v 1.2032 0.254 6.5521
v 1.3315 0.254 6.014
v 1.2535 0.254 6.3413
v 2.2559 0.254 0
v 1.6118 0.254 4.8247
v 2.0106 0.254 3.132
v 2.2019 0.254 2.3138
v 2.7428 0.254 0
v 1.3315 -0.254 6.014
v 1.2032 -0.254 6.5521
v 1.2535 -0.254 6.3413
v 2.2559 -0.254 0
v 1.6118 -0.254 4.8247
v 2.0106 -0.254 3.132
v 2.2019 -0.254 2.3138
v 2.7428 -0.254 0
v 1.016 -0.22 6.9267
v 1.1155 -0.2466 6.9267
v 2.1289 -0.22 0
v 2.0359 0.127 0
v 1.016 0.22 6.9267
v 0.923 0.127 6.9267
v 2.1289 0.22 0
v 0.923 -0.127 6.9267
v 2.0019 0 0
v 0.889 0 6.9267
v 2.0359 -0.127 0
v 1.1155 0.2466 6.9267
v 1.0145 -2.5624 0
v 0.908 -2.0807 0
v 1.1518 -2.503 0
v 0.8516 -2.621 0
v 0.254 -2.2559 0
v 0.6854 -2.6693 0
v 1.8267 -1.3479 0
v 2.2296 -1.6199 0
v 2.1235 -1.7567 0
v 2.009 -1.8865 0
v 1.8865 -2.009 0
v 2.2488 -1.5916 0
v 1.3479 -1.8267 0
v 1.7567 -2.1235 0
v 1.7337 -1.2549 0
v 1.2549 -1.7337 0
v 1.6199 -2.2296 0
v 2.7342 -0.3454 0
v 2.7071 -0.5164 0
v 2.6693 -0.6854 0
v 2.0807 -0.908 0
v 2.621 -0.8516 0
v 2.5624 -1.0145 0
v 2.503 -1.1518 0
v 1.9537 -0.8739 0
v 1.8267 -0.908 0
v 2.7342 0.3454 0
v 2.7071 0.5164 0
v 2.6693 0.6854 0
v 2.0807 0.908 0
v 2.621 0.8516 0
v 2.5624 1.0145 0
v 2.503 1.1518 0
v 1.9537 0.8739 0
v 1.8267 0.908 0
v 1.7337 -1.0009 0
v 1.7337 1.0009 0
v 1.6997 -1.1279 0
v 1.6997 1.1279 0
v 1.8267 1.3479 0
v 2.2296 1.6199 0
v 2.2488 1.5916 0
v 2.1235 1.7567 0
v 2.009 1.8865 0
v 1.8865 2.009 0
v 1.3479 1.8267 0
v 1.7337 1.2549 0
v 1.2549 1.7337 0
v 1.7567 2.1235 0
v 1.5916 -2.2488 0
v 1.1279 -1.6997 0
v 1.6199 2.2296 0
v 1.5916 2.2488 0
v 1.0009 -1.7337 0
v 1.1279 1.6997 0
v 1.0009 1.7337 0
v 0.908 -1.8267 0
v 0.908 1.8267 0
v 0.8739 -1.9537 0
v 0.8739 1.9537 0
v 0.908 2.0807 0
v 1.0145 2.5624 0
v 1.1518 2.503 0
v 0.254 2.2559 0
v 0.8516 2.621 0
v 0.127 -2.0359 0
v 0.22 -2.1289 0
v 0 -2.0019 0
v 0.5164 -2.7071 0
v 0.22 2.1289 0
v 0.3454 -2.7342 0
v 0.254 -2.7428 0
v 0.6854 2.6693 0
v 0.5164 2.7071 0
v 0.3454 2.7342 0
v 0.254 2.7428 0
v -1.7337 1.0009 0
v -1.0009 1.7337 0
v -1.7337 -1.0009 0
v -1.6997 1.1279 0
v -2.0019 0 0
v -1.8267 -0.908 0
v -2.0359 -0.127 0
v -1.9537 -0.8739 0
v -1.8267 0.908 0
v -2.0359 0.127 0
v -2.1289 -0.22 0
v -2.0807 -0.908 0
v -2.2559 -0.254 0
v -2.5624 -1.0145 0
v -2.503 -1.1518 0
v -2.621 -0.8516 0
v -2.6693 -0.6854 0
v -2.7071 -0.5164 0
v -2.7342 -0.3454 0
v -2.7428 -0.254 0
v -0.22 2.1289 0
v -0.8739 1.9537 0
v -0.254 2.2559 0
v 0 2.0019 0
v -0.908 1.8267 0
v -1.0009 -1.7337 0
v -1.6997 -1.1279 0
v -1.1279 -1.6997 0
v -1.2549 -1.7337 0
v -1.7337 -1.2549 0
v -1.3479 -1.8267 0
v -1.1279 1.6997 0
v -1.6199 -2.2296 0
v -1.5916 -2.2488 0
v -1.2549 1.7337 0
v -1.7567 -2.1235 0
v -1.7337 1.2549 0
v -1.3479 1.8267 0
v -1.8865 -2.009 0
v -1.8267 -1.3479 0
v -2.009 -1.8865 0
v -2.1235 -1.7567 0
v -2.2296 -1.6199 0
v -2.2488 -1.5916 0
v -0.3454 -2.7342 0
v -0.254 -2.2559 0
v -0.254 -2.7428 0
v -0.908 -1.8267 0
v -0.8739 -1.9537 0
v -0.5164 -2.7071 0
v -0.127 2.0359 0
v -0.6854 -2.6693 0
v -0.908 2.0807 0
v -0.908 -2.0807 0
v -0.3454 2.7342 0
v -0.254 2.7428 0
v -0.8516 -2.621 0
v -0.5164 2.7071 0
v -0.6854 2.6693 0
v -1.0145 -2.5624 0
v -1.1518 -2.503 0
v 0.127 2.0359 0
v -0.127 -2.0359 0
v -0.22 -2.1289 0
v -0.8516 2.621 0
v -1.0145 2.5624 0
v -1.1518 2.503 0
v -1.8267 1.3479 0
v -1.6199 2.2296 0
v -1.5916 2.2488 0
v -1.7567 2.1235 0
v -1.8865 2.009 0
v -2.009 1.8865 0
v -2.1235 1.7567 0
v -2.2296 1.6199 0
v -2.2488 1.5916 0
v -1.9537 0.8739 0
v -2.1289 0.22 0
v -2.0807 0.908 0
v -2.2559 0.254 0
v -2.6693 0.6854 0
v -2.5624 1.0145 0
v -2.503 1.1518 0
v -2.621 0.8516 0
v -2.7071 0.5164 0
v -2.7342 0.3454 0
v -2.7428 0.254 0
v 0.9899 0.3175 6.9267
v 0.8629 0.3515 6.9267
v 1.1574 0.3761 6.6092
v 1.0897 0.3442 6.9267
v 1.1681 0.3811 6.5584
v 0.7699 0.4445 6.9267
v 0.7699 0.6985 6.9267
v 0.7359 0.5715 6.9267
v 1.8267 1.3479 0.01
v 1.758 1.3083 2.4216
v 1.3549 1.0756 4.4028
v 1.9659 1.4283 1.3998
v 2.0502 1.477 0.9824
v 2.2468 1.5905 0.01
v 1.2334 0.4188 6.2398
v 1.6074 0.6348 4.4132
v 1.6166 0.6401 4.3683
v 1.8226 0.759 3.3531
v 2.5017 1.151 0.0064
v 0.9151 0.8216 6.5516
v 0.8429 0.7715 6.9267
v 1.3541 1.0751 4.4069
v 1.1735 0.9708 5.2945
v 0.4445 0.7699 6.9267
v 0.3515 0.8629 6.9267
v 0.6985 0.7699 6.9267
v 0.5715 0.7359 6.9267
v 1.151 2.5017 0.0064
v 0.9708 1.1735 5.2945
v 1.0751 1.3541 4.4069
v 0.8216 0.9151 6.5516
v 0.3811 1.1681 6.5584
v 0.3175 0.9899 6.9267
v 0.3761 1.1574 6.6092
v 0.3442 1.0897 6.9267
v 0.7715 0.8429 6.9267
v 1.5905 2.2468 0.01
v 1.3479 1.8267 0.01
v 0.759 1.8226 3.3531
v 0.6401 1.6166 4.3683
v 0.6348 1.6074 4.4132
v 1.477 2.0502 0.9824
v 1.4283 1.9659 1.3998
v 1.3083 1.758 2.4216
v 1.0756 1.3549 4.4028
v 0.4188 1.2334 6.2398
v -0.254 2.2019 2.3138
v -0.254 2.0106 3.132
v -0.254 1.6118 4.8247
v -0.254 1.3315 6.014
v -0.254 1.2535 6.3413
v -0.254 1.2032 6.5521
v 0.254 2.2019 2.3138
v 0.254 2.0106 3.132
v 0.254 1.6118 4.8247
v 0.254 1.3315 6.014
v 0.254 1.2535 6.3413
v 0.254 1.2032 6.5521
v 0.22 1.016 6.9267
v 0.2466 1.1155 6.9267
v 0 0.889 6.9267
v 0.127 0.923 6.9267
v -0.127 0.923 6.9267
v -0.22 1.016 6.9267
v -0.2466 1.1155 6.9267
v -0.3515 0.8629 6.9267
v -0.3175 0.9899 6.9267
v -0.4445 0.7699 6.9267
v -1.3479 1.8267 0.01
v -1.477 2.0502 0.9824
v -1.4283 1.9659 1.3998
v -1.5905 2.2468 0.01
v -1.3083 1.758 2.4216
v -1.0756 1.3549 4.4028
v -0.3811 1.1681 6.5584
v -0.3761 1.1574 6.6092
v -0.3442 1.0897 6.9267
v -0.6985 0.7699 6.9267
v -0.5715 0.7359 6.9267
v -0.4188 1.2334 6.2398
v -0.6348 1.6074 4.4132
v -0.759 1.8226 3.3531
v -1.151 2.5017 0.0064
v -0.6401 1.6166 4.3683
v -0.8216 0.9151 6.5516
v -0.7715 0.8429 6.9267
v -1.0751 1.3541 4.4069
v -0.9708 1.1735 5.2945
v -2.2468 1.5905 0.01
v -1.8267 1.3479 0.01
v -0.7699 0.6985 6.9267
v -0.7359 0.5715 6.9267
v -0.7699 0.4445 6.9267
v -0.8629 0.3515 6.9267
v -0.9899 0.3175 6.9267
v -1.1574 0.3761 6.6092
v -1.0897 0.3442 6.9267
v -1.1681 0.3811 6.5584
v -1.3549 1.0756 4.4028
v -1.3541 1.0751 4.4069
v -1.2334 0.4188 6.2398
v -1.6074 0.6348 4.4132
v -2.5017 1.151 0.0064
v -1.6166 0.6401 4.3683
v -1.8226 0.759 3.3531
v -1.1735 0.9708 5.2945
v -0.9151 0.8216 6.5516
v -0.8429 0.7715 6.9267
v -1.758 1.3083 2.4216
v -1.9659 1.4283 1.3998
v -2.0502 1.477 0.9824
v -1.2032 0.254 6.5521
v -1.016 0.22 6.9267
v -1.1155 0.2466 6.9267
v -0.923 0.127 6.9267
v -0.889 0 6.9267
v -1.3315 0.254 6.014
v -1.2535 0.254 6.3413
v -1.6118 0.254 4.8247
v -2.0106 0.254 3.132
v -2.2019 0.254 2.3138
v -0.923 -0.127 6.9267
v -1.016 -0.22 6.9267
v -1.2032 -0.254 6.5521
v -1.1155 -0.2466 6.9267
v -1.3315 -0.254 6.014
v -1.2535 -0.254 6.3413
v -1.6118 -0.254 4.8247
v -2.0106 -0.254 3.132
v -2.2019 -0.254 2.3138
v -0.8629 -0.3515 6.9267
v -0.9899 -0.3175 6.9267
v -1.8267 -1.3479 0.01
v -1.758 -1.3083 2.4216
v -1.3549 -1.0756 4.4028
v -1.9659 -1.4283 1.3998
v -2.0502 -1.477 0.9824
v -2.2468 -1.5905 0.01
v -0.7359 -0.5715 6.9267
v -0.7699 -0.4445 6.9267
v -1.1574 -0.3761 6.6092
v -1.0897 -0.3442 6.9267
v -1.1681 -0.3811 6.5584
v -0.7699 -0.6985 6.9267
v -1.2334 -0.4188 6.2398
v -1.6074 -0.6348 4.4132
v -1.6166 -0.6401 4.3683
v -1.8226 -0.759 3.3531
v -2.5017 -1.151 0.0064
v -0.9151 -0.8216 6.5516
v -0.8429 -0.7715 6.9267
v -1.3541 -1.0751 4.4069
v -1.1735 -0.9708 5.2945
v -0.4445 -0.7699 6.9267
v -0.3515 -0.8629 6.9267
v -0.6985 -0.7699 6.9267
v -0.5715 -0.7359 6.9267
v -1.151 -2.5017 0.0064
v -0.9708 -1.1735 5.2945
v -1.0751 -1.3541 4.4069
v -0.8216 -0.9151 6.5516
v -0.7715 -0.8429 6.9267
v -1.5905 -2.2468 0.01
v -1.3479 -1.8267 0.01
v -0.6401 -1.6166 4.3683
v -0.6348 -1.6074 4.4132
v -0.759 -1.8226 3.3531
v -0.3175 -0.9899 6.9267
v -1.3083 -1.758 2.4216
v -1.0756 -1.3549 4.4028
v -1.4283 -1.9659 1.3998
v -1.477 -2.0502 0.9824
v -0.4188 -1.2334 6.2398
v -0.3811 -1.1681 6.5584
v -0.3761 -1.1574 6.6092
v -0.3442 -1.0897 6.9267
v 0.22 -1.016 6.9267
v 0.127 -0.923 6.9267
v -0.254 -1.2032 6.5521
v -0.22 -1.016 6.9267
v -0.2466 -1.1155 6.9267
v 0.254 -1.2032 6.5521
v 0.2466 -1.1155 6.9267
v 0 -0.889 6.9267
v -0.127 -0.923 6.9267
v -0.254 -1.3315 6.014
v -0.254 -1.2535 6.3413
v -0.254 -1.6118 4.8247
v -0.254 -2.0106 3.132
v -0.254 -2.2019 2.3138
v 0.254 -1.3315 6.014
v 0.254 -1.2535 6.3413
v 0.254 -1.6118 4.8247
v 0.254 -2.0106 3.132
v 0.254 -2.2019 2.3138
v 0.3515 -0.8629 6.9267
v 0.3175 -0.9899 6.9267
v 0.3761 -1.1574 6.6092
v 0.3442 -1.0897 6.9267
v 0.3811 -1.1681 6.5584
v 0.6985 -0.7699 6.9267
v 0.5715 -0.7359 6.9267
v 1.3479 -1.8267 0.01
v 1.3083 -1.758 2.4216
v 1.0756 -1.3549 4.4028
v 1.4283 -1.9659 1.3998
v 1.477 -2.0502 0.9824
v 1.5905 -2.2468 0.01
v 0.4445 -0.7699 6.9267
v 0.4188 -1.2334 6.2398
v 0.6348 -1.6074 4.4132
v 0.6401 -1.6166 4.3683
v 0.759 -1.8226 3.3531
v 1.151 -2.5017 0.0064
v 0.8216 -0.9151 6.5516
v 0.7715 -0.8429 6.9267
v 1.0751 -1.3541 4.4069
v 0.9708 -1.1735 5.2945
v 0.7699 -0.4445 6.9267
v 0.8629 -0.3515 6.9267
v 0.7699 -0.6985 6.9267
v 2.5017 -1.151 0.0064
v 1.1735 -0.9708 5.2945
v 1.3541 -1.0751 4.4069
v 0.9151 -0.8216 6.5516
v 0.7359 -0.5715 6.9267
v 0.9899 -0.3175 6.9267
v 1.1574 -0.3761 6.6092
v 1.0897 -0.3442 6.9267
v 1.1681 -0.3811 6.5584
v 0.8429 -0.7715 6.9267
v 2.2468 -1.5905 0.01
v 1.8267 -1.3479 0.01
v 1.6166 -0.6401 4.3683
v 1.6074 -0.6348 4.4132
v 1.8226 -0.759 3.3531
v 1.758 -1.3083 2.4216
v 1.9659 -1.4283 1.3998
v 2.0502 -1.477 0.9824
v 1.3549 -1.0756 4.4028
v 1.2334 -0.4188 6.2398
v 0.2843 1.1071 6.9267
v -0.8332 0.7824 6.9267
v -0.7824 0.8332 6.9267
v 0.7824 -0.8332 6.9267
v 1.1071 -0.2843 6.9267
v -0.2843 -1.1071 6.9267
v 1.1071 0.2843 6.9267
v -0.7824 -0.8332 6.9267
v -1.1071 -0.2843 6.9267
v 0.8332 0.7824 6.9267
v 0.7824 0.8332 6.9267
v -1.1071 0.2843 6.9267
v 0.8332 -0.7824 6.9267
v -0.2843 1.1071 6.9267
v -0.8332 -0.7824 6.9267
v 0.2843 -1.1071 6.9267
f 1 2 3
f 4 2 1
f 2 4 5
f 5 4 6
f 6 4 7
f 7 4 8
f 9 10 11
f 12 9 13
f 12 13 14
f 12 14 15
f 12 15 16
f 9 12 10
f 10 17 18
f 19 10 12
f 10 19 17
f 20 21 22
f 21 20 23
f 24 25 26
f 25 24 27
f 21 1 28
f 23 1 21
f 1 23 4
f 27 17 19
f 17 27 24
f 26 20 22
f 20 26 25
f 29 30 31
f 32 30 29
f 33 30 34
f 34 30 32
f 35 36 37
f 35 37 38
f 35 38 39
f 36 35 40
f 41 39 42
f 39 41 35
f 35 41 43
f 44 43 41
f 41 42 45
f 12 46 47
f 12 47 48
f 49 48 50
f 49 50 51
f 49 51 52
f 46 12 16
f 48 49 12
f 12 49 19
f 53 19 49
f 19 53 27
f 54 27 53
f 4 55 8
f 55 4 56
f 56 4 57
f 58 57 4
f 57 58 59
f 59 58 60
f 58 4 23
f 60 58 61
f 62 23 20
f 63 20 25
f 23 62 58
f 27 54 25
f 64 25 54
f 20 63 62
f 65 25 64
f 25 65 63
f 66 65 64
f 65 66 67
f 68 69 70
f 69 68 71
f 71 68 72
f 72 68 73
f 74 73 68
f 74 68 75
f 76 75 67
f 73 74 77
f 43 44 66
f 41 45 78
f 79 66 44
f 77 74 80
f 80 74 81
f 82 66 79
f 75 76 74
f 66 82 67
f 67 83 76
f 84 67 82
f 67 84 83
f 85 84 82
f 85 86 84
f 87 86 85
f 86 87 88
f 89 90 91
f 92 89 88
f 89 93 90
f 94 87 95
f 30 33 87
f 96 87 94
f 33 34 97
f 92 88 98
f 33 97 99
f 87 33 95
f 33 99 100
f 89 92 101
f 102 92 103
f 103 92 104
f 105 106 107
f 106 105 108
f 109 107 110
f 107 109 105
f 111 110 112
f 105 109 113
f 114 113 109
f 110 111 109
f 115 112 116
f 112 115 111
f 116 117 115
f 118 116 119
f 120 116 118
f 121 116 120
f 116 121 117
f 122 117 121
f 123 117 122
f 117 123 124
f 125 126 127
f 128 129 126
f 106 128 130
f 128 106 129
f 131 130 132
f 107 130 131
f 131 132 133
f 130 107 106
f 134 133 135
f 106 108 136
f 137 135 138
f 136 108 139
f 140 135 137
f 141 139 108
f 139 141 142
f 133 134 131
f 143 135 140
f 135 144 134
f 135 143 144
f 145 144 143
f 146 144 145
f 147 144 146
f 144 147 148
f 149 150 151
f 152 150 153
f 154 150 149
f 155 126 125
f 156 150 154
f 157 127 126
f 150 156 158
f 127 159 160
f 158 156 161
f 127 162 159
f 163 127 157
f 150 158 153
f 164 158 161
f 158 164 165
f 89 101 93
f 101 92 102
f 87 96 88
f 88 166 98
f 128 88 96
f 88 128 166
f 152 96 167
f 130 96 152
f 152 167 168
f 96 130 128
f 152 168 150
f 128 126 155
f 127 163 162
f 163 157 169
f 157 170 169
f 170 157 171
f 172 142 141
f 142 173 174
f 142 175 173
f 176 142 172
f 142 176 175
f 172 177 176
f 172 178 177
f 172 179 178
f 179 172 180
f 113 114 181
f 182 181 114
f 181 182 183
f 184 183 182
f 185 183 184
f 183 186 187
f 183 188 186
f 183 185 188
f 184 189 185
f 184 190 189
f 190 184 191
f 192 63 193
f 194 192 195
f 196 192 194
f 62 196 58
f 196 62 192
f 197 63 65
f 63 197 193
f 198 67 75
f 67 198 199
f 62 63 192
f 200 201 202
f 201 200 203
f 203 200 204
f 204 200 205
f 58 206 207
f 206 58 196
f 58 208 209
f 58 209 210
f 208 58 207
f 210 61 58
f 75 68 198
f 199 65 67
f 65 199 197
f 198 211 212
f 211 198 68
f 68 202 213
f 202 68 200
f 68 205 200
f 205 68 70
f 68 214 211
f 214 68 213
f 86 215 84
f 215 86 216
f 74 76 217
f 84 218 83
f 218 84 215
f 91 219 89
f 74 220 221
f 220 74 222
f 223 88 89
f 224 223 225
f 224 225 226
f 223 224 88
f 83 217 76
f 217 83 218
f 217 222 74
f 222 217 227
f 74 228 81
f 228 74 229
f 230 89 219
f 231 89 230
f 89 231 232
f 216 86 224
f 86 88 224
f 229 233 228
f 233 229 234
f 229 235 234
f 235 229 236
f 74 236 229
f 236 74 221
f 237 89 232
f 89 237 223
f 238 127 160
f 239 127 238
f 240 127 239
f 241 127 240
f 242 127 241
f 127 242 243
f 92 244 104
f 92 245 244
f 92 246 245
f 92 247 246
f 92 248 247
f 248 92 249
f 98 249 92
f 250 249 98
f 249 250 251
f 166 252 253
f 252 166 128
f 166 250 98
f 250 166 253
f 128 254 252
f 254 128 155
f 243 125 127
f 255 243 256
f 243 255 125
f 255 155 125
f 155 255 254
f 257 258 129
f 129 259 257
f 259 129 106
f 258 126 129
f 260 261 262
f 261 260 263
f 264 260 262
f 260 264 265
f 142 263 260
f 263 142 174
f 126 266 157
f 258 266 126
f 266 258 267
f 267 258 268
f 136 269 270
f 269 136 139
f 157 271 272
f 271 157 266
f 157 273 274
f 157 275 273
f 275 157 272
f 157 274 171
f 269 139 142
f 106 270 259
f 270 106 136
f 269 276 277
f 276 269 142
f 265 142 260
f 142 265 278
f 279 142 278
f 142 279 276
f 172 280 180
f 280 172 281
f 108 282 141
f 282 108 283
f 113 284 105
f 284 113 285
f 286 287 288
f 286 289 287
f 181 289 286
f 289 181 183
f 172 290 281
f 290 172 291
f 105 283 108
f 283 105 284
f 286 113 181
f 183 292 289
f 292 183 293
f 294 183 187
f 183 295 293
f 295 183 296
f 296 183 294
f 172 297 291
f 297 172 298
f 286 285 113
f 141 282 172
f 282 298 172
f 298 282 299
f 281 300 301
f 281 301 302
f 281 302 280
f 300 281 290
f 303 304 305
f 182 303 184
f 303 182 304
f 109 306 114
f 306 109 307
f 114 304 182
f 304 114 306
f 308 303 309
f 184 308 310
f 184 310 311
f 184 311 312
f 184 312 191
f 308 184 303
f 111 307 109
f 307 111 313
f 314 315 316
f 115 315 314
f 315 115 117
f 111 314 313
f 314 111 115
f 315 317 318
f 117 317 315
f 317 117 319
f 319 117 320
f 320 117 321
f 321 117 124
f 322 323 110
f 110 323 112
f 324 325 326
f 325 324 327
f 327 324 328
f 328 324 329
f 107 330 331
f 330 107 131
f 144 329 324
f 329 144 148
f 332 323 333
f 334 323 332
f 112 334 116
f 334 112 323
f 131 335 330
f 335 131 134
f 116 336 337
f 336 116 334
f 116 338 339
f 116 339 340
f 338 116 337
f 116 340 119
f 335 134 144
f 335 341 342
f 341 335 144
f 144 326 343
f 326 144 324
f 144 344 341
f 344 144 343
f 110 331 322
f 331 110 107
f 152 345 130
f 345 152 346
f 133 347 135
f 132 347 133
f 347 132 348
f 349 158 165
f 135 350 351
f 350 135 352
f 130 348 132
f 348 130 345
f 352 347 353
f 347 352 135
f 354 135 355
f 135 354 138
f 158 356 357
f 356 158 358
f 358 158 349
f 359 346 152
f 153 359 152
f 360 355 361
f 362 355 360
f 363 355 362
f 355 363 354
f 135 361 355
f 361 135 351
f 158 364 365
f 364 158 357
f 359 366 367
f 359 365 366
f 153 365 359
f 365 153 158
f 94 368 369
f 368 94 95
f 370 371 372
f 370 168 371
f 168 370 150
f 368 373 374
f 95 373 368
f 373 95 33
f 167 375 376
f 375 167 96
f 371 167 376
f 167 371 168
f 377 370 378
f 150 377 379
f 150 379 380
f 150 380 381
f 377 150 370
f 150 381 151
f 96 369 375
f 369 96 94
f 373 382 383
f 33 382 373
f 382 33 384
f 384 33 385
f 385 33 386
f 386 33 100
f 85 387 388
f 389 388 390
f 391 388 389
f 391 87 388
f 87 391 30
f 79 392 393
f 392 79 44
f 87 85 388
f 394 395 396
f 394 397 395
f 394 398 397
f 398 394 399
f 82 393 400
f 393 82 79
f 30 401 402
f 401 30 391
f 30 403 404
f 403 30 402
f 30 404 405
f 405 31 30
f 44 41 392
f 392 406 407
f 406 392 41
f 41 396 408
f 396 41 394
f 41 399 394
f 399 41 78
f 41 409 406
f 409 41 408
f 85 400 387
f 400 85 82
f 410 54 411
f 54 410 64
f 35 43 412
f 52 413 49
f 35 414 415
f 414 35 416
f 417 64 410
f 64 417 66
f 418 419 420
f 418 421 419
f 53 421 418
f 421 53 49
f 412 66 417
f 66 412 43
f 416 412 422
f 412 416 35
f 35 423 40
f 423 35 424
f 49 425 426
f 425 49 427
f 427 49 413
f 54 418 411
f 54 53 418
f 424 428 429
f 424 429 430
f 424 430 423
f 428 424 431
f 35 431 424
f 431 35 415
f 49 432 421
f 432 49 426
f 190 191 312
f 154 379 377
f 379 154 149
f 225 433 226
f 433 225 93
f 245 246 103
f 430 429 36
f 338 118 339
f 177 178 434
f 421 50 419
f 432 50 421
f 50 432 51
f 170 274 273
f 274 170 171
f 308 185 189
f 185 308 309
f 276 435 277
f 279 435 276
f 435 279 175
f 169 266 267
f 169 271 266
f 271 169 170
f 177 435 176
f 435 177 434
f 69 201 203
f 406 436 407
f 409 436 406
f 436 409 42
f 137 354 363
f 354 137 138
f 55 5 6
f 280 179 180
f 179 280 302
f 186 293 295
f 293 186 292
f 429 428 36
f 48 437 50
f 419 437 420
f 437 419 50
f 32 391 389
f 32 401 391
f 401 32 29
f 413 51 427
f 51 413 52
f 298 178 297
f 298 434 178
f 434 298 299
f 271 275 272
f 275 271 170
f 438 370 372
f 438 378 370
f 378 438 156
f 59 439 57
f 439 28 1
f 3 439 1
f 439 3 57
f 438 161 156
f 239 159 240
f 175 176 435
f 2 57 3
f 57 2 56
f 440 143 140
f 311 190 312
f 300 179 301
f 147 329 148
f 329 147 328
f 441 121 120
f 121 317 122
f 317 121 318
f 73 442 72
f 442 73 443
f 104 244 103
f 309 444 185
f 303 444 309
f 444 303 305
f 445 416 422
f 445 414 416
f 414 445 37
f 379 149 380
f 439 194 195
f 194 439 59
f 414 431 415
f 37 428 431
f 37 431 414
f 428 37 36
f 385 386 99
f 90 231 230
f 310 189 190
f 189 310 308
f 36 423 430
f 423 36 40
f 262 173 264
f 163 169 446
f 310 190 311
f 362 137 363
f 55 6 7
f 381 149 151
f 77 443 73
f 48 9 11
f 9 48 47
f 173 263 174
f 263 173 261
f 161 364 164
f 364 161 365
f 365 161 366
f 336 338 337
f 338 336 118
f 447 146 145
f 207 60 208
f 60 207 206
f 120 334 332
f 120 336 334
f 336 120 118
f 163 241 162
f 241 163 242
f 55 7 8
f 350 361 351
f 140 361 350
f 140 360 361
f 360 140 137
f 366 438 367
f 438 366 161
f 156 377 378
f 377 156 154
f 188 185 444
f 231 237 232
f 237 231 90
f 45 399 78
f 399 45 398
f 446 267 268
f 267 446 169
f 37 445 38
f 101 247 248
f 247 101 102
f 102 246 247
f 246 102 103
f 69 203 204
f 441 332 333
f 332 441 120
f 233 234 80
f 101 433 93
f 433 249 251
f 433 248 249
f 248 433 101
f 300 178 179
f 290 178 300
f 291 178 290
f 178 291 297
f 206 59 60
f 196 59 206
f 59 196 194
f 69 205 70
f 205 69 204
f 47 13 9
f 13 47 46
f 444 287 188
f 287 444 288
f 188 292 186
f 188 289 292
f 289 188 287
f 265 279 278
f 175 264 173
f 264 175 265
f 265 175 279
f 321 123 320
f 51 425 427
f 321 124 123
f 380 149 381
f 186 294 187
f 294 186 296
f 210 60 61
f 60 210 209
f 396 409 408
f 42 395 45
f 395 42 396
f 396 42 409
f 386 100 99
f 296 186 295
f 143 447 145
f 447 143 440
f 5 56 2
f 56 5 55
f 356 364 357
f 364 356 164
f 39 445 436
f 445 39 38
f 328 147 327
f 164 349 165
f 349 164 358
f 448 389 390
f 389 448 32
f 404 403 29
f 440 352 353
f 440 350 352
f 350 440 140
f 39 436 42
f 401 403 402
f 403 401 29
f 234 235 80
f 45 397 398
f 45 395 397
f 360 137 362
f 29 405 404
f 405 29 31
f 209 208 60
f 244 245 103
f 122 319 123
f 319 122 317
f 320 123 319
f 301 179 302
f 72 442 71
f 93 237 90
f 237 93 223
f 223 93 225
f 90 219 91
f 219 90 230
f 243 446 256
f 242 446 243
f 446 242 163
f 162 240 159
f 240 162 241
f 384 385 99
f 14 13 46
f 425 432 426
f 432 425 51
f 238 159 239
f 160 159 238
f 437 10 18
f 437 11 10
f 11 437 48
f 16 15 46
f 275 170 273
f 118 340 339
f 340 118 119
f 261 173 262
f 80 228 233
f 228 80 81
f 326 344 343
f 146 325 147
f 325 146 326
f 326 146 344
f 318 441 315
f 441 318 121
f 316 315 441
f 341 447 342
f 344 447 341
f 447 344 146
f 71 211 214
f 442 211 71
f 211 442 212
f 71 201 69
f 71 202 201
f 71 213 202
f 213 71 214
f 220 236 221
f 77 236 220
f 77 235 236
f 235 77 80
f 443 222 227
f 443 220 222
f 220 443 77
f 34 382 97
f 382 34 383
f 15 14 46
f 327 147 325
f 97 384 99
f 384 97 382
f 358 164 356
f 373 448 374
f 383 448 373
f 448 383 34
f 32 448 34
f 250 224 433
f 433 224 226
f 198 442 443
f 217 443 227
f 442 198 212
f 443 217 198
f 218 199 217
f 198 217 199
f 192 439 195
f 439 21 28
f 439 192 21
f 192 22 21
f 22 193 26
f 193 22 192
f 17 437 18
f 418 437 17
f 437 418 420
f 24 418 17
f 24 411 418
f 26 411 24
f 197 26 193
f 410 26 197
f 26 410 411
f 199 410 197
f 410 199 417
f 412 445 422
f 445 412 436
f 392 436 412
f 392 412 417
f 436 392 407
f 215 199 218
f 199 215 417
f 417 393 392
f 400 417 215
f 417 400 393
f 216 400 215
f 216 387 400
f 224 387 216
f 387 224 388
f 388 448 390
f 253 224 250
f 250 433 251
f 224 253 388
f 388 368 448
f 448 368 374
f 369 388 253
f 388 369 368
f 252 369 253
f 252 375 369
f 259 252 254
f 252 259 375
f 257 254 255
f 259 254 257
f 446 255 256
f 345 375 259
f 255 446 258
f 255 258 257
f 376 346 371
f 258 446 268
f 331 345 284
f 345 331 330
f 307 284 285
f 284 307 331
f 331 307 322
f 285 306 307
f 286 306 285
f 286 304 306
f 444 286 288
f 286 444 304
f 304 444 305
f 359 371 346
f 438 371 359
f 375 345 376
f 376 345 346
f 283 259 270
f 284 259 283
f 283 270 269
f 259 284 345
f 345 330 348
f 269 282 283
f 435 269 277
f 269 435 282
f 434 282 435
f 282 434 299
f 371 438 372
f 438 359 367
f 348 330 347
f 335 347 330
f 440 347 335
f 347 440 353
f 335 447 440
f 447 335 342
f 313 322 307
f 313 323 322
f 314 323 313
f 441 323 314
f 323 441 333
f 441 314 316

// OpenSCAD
// Units: Inches
$fn = 100;

INCH = 25.4;

bottom_diameter = 0.217 * INCH;
top_diameter = 0.090 * INCH;
side_length = 0.28 * INCH;

r1 = bottom_diameter / 2;
r2 = top_diameter / 2;

// Calculate height using Pythagorean theorem: 
radius_diff = abs(r1 - r2);
height = sqrt(pow(side_length, 2) - pow(radius_diff, 2));

num_teeth = 12;
tooth_depth = .02 * INCH;
tooth_width_angle = 360 / num_teeth;
flute_twist = 0; // degrees of twist from bottom to top for right rake

tooth_cut_mm = 0.5; // 0.5mm cut into the base

module flute_on_cone(angle) {
    // The flute is a thin box that starts just 0.5mm inside the base and extends to the outside at the top
    hull() {
        // Bottom of flute (cuts 0.5mm into the base)
        rotate([0,0,angle])
            translate([r1 + tooth_depth/2, 0, 0])
                cylinder(h=0.01, r=tooth_depth/2, $fn=12);
        rotate([0,0,angle])
            translate([r1 - tooth_cut_mm, 0, 0])
                cylinder(h=0.01, r=tooth_depth/2, $fn=12);
        // Top of flute (at top of cone, outside, with twist)
        rotate([0,0,angle - flute_twist])
            translate([r2 + tooth_depth/2, 0, height])
                cylinder(h=0.01, r=tooth_depth/2, $fn=12);
        rotate([0,0,angle - flute_twist])
            translate([r2, 0, height])
                cylinder(h=0.01, r=tooth_depth/2, $fn=12);
    }
}

module fluted_cone() {
    difference() {
        // Main cone
        cylinder(r1 = r1, r2 = r2, h = height, $fn = 100);

        // Flutes (serrations), following the cone's surface, now on the outside and cutting just 0.5mm into the base
        for (i = [0:num_teeth-1]) {
            angle = i * tooth_width_angle;
            flute_on_cone(angle);
        }
    }
}

fluted_cone();
